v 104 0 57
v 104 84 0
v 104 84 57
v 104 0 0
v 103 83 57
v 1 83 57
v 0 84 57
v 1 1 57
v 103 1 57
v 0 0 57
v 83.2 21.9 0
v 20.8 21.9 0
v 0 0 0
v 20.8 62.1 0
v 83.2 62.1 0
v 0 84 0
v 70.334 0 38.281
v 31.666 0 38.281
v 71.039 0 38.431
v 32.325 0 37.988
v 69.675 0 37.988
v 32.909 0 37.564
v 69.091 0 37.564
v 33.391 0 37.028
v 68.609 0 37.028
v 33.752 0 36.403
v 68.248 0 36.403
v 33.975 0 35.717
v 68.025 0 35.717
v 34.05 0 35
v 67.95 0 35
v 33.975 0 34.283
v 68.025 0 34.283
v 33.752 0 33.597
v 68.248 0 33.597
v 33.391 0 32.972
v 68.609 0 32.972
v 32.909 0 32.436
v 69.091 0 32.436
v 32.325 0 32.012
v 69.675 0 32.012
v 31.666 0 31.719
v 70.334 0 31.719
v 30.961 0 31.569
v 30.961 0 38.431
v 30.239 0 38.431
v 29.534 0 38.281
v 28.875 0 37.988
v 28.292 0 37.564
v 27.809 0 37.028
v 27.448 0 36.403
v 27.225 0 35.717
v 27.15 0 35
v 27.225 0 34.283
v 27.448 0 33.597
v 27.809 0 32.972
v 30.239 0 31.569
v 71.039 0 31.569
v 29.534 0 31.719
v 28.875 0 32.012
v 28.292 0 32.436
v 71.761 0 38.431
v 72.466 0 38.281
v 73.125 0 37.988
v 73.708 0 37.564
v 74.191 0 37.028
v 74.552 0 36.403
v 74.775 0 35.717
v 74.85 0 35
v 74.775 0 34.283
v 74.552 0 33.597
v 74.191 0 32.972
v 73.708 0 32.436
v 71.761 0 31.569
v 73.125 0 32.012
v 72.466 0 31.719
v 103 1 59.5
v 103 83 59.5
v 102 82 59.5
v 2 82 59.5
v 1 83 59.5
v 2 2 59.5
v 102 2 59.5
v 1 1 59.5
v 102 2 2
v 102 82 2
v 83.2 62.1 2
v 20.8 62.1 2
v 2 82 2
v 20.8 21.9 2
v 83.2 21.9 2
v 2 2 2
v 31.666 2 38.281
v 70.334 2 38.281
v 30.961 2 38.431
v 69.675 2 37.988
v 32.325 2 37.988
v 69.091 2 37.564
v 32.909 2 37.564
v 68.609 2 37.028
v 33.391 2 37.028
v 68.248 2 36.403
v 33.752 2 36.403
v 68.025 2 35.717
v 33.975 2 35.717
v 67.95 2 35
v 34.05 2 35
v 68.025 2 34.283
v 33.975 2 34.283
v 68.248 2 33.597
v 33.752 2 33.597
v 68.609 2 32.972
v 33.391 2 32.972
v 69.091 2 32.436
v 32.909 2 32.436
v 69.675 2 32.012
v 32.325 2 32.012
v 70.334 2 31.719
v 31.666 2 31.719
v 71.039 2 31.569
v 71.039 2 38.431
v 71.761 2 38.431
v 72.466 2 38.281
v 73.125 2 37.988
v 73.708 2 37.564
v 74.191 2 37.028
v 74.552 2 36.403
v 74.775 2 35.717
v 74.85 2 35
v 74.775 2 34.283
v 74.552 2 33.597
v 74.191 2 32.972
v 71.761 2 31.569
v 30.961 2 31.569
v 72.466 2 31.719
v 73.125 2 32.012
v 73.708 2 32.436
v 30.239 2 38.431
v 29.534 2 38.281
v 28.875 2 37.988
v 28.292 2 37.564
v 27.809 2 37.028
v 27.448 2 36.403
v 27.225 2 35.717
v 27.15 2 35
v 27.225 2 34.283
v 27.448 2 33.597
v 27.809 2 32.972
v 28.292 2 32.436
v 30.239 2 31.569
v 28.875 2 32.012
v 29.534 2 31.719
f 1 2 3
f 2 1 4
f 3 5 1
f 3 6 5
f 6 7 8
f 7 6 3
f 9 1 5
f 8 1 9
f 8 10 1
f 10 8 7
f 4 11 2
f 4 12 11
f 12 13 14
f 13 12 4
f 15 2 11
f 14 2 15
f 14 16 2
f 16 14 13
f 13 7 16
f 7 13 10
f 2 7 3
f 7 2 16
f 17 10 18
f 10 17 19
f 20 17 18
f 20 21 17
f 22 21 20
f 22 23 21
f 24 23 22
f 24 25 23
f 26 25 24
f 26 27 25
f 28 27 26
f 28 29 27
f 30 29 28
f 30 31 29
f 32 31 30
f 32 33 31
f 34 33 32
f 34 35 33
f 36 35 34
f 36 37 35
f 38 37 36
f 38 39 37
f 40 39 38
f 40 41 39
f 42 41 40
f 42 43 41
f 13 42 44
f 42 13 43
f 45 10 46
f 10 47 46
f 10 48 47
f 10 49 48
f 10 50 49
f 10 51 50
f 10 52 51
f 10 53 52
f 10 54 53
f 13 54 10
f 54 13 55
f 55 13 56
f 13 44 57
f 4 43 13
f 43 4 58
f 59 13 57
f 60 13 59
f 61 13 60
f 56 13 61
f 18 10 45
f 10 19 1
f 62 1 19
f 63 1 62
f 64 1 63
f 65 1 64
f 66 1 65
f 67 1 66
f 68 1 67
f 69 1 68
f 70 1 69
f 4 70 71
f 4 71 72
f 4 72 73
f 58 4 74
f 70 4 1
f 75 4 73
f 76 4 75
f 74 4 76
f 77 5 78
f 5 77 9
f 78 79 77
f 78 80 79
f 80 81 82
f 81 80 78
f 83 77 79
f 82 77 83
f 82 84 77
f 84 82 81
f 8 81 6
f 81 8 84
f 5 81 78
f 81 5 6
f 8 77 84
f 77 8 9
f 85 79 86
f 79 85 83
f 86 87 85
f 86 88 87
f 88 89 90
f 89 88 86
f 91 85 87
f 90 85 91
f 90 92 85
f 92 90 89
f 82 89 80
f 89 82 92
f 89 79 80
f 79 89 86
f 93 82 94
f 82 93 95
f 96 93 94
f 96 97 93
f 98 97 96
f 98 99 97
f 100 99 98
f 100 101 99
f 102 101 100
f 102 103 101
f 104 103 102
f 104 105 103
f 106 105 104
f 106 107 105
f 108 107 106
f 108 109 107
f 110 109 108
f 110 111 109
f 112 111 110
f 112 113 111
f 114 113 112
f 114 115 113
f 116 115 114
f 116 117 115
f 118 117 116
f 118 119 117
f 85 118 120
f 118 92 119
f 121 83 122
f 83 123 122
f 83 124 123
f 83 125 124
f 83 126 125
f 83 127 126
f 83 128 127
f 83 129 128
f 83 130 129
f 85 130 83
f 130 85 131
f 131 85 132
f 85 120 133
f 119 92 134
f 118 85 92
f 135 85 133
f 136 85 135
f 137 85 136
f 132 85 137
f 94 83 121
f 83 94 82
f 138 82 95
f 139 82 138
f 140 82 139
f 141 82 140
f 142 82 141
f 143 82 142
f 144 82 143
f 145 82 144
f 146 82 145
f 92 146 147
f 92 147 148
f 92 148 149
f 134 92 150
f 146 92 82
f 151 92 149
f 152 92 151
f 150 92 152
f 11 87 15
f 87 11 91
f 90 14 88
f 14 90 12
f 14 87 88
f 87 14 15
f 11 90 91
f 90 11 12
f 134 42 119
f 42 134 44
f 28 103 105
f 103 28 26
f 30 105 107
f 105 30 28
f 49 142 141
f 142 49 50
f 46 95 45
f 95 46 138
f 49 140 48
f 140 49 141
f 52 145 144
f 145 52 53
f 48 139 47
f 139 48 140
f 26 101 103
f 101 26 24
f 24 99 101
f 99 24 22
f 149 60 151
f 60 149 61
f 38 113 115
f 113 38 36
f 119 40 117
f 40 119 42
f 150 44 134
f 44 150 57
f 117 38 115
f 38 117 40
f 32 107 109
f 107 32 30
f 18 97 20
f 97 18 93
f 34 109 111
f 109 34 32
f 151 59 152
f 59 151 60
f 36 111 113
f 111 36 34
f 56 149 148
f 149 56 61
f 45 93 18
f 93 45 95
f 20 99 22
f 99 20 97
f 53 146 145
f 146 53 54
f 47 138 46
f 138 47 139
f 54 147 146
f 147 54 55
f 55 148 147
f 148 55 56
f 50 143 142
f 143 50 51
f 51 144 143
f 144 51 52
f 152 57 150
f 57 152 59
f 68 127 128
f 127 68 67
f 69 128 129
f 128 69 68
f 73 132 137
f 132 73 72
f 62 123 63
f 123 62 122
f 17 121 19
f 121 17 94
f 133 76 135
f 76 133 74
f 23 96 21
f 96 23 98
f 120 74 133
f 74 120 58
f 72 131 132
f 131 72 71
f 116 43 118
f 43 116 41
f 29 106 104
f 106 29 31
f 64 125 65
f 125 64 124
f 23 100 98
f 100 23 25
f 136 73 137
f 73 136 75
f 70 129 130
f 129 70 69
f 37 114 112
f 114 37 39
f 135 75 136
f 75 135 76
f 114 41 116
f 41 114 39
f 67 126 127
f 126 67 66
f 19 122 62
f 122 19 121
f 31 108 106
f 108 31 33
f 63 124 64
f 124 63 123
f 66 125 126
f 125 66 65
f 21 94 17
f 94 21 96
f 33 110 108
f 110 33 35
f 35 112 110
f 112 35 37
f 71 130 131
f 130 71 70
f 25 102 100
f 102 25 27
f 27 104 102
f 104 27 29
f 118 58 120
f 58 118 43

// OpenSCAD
wallthickness = 1; // this is the wall of the lip, the box is twice as thick
internalx = 100; // internal x dimension
internaly = 80; // internal y dimension
internalz = 60; // internal overall z dimension
internal_lidz=45; // this is taken of off the internalz for the bottom height and acts as the lid internal height
led_x = 62.4;
led_y = 40.2;
cable_hole = 6;
rotary_hole = 6.9/2;

lip_overlap = 2.5; // how much overlap between box and lid, this works as a default but can be shrunk as needed

lipspacing=0; // this amount is take off of the wall thickness on the lip to increase spacing, if your lid is too tight you can increase this but it will reduce the actual wall thickness on the lip so too much and you will have to increase the wallthickness to compensate. Should be 0 in ideal world, you will likely be better just lightly sanding the lip unless your printer is way out

//#############################
// INTERNAL VARIABLES, DO NOT MODIFY
internal_botz=internalz-lip_overlap*2;

actual_y=internaly+(4*wallthickness);
actual_x=internalx+(4*wallthickness);
actual_lidz=lip_overlap*2+(2*wallthickness);
actual_botz=internal_botz+(2*wallthickness);

lip_x = internalx+(2*wallthickness);
lip_y = internaly+(2*wallthickness);


//###########################
module led() {
  cube([led_x, led_y, lip_overlap+.3]);
}

module rotary() {
  cylinder(r = rotary_hole, h = actual_lidz+lip_overlap, $fn = 30);
}

module bottom() {
  difference() {
    union() {
      cube([actual_x,actual_y,actual_botz]);
      translate([wallthickness,wallthickness,actual_botz])
        cube([lip_x,lip_y,lip_overlap]);
    }
    
    translate([(2*wallthickness),(2*wallthickness),(2*wallthickness)])
      cube([internalx,internaly,internalz]);

    translate([(2*wallthickness+internalx/2-led_x/2),(2*wallthickness+internaly/2-led_y/2),-0.1])
      rotate([0,0,0])
        led();

    translate([lip_x/5*1.5,5,35])
      rotate([90,0,0])
        rotary();
    translate([lip_x/5*3.5,5,35])
      rotate([90,0,0])
        rotary();

  }
}


module lid() {
  difference() {
    cube([actual_x,actual_y,actual_lidz+internal_lidz]);
    
    translate([(2*wallthickness),(2*wallthickness),-.1])
      cube([internalx,internaly,internal_lidz+lip_overlap+.1]);
    
    translate([(wallthickness)-lipspacing/2,(wallthickness)-lipspacing/2,-.1])
      cube([lip_x+lipspacing,lip_y+lipspacing,lip_overlap+.3]);
    
    // passe cable
    #translate([internalx,lip_y-7.5,wallthickness])
      rotate([0,90,0])
        cylinder(r = 7.5, h = 10, $fn = 30);
  }
}

*translate([0,0,actual_botz + internal_lidz + 10])lid();
bottom();
*translate([0,0,(internal_lidz + 10)-3])
  rotate([180,0,0])
    lid();
